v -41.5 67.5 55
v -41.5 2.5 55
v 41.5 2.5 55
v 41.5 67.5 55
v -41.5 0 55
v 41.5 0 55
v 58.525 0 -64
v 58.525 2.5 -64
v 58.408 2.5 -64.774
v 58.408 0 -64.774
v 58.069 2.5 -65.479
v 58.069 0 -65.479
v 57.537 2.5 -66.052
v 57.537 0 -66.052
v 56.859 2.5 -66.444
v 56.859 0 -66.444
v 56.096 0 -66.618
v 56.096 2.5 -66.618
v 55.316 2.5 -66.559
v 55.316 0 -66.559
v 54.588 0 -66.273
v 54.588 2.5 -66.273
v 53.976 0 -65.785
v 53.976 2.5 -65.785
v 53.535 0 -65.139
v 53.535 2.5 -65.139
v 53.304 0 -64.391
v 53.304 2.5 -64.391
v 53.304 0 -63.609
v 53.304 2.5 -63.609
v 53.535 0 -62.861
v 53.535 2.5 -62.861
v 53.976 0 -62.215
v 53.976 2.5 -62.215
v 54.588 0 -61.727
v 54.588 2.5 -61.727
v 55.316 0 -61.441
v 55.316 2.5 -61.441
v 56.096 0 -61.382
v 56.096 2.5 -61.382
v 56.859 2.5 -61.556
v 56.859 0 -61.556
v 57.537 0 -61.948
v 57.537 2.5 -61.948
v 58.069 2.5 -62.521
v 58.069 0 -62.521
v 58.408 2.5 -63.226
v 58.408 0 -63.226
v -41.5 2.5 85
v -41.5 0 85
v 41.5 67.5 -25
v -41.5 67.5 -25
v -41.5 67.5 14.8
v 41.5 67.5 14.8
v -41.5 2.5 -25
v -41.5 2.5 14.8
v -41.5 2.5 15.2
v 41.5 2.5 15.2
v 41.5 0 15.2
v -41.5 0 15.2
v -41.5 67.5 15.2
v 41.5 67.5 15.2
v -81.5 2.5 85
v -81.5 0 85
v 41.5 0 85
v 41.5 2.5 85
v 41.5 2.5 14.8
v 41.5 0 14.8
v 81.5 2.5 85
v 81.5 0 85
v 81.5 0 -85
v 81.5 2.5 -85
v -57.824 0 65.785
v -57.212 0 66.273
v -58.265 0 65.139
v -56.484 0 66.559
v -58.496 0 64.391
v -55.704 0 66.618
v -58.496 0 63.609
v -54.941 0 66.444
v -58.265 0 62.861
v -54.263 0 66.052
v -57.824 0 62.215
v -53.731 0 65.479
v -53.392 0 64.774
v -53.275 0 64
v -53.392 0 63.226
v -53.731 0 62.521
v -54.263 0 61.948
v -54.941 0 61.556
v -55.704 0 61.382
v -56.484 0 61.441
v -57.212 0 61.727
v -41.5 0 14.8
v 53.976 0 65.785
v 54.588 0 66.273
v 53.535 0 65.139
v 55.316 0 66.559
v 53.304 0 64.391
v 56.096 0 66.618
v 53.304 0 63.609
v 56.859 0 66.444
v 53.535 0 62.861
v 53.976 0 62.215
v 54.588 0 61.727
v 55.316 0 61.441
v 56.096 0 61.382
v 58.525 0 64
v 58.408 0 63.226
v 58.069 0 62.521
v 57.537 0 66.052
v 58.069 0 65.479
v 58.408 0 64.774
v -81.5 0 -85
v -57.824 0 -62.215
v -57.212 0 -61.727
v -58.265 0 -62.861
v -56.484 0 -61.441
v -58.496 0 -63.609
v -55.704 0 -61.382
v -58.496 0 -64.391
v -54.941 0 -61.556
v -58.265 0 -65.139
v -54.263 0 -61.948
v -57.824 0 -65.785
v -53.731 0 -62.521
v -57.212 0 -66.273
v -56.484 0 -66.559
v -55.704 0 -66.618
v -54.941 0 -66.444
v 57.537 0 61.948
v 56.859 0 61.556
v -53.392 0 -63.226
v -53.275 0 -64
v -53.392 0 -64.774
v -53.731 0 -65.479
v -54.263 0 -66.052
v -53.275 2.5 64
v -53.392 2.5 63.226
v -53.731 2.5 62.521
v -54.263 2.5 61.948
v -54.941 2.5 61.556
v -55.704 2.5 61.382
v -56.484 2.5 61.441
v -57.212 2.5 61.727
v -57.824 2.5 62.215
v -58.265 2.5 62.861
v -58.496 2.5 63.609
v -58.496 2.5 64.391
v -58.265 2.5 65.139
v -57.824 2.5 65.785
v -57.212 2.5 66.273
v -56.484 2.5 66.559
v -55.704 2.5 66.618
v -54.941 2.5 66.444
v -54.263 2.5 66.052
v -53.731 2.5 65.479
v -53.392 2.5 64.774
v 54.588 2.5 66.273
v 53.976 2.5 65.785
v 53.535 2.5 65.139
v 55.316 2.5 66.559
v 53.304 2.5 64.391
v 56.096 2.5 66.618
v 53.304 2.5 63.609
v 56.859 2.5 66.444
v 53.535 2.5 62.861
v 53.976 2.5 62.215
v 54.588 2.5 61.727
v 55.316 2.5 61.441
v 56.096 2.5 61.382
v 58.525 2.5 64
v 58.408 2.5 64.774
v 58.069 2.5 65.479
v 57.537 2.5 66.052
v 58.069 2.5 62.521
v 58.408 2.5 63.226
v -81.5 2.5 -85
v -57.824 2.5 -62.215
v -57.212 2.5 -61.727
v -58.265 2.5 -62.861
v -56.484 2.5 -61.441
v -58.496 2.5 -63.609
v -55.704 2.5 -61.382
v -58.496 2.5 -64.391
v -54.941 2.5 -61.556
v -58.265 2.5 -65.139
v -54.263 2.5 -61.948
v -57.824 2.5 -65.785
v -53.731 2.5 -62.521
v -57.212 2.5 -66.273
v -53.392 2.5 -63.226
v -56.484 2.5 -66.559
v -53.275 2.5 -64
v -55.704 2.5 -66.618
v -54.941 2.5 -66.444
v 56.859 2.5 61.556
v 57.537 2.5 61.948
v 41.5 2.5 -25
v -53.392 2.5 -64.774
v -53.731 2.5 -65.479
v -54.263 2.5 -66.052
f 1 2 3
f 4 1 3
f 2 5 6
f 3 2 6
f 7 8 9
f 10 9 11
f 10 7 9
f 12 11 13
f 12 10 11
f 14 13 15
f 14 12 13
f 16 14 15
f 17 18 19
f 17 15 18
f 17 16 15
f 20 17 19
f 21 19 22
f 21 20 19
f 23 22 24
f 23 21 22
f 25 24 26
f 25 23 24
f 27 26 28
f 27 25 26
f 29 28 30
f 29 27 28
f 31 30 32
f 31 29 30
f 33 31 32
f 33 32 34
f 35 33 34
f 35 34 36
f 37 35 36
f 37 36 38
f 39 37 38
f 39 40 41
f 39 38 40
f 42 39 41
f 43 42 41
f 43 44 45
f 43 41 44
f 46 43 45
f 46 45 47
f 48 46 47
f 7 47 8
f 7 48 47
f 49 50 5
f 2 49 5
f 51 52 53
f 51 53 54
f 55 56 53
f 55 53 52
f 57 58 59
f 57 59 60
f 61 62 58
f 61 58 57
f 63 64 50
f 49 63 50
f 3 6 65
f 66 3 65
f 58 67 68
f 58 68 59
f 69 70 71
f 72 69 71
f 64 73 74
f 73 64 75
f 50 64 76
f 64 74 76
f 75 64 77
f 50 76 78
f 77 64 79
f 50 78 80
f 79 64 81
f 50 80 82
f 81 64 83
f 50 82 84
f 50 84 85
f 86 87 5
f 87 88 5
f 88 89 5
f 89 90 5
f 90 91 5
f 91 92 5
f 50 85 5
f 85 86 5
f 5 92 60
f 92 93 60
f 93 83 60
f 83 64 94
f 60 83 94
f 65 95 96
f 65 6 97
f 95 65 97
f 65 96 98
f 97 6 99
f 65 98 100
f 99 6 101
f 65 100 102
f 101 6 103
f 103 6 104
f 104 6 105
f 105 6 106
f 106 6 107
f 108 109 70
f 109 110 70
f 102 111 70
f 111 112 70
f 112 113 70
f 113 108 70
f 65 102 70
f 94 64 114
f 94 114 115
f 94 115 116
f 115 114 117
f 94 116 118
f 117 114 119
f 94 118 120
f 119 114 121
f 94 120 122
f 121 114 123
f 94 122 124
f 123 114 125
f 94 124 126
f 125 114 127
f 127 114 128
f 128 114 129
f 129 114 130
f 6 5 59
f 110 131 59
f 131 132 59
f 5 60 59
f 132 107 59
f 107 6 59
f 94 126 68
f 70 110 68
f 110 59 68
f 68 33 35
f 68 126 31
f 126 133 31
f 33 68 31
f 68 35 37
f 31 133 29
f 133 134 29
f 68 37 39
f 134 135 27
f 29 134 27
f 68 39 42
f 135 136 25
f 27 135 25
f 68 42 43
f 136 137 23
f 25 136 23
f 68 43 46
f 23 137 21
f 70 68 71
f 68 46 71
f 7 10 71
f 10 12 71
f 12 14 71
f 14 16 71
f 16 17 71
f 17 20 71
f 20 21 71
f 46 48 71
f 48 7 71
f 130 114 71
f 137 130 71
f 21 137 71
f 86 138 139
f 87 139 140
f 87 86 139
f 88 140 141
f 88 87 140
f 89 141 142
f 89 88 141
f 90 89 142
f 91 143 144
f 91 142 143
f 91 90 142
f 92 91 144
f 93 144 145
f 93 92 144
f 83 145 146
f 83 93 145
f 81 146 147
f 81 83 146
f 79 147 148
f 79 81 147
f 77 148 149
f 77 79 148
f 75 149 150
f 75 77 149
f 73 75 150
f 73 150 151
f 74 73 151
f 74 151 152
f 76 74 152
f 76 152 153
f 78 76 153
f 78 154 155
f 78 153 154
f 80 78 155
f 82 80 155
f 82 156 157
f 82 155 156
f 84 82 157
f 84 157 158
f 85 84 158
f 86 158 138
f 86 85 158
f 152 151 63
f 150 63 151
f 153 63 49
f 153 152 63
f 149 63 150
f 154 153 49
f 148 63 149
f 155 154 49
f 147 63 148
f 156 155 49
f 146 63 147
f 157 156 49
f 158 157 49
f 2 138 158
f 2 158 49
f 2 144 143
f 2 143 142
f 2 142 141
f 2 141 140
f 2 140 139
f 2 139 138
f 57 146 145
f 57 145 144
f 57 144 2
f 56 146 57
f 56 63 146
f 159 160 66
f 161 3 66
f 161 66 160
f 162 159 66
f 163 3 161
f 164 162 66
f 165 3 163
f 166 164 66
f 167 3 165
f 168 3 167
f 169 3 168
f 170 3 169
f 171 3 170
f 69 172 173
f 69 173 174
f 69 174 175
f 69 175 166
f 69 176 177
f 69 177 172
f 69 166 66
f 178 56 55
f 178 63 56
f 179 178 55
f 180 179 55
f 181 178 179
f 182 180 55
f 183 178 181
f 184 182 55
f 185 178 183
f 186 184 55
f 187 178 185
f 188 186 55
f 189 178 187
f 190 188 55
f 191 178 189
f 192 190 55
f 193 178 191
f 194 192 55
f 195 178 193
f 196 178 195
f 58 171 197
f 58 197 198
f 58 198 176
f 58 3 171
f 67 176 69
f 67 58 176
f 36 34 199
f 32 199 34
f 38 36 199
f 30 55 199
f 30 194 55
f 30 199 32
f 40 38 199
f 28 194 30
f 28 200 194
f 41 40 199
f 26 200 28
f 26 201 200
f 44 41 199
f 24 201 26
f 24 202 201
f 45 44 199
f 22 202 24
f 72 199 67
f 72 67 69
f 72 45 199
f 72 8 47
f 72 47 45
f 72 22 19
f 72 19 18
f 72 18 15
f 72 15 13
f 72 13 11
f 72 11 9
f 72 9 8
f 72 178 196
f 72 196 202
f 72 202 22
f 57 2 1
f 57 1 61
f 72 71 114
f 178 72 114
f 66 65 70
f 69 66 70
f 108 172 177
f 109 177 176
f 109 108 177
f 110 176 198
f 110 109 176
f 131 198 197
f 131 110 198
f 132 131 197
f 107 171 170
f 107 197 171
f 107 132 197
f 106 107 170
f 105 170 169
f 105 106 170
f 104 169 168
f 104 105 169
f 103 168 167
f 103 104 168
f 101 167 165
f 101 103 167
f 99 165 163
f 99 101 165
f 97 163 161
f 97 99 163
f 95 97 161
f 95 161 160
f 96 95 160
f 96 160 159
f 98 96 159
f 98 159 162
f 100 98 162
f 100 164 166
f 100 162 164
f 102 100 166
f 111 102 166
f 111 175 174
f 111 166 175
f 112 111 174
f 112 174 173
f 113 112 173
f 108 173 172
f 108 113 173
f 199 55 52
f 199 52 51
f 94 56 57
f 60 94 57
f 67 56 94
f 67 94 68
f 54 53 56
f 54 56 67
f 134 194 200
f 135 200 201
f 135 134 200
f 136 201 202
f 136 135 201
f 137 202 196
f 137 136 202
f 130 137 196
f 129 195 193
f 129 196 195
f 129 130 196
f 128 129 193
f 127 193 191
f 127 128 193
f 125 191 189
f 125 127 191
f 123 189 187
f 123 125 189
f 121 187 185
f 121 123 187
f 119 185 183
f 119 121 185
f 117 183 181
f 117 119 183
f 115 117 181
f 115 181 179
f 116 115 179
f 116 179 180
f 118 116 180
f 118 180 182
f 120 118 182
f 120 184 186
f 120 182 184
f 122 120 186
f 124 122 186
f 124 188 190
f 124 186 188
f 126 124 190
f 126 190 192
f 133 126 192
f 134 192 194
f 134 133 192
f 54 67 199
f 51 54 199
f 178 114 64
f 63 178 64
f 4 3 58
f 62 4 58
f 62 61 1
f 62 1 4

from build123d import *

# Parameters (mm, degrees)
SALIENTE_EXTRUIR1_DEPTH = 2.5
CROQUIS2_W              = 83
CROQUIS2_H              = 80
SALIENTE_EXTRUIR2_DEPTH = 65
CORTAR_EXTRUIR1_DEPTH   = 71
CROQUIS4_R              = 2.625
CORTAR_EXTRUIR2_DEPTH   = 68.5


with BuildPart() as part:
    # Croquis1 → Saliente-Extruir1 (new body)
    with BuildSketch(Plane(origin=(0, 0, 0), x_dir=(1, 0, 0), z_dir=(0, 1, 0))):
        Polygon((41.5, -85), (81.5, -85), (81.5, 85), (-81.5, 85), (-81.5, -85), (-41.5, -85), (-41.5, -55), (41.5, -55), align=None)
    extrude(amount=SALIENTE_EXTRUIR1_DEPTH)

    # Croquis2 → Saliente-Extruir2 (add)
    with BuildSketch(Plane(origin=(0, 2.5, 0), x_dir=(1, 0, 0), z_dir=(0, 1, 0))):
        with Locations((0, -15)):
            Rectangle(CROQUIS2_W, CROQUIS2_H)
    extrude(amount=SALIENTE_EXTRUIR2_DEPTH)

    # Croquis3 → Cortar-Extruir1 (cut, through all)
    with BuildSketch(Plane(origin=(0, 70, 0), x_dir=(1, 0, 0), z_dir=(0, 1, 0))):
        Polygon((-41.5, -15), (-41.5, -14.8), (41.5, -14.8), (41.5, -15.2), (-41.5, -15.2), align=None)
    extrude(amount=-CORTAR_EXTRUIR1_DEPTH, mode=Mode.SUBTRACT)

    # Croquis4 → Cortar-Extruir2 (cut, through all)
    with BuildSketch(Plane(origin=(0, 0, 0), x_dir=(1, 0, 0), z_dir=(0, 1, 0))):
        with Locations((-55.9, -64)):
            Circle(CROQUIS4_R)
        with Locations((55.9, -64)):
            Circle(CROQUIS4_R)
        with Locations((-55.9, 64)):
            Circle(CROQUIS4_R)
        with Locations((55.9, 64)):
            Circle(CROQUIS4_R)
    extrude(amount=CORTAR_EXTRUIR2_DEPTH, mode=Mode.SUBTRACT)


solid = part.part
